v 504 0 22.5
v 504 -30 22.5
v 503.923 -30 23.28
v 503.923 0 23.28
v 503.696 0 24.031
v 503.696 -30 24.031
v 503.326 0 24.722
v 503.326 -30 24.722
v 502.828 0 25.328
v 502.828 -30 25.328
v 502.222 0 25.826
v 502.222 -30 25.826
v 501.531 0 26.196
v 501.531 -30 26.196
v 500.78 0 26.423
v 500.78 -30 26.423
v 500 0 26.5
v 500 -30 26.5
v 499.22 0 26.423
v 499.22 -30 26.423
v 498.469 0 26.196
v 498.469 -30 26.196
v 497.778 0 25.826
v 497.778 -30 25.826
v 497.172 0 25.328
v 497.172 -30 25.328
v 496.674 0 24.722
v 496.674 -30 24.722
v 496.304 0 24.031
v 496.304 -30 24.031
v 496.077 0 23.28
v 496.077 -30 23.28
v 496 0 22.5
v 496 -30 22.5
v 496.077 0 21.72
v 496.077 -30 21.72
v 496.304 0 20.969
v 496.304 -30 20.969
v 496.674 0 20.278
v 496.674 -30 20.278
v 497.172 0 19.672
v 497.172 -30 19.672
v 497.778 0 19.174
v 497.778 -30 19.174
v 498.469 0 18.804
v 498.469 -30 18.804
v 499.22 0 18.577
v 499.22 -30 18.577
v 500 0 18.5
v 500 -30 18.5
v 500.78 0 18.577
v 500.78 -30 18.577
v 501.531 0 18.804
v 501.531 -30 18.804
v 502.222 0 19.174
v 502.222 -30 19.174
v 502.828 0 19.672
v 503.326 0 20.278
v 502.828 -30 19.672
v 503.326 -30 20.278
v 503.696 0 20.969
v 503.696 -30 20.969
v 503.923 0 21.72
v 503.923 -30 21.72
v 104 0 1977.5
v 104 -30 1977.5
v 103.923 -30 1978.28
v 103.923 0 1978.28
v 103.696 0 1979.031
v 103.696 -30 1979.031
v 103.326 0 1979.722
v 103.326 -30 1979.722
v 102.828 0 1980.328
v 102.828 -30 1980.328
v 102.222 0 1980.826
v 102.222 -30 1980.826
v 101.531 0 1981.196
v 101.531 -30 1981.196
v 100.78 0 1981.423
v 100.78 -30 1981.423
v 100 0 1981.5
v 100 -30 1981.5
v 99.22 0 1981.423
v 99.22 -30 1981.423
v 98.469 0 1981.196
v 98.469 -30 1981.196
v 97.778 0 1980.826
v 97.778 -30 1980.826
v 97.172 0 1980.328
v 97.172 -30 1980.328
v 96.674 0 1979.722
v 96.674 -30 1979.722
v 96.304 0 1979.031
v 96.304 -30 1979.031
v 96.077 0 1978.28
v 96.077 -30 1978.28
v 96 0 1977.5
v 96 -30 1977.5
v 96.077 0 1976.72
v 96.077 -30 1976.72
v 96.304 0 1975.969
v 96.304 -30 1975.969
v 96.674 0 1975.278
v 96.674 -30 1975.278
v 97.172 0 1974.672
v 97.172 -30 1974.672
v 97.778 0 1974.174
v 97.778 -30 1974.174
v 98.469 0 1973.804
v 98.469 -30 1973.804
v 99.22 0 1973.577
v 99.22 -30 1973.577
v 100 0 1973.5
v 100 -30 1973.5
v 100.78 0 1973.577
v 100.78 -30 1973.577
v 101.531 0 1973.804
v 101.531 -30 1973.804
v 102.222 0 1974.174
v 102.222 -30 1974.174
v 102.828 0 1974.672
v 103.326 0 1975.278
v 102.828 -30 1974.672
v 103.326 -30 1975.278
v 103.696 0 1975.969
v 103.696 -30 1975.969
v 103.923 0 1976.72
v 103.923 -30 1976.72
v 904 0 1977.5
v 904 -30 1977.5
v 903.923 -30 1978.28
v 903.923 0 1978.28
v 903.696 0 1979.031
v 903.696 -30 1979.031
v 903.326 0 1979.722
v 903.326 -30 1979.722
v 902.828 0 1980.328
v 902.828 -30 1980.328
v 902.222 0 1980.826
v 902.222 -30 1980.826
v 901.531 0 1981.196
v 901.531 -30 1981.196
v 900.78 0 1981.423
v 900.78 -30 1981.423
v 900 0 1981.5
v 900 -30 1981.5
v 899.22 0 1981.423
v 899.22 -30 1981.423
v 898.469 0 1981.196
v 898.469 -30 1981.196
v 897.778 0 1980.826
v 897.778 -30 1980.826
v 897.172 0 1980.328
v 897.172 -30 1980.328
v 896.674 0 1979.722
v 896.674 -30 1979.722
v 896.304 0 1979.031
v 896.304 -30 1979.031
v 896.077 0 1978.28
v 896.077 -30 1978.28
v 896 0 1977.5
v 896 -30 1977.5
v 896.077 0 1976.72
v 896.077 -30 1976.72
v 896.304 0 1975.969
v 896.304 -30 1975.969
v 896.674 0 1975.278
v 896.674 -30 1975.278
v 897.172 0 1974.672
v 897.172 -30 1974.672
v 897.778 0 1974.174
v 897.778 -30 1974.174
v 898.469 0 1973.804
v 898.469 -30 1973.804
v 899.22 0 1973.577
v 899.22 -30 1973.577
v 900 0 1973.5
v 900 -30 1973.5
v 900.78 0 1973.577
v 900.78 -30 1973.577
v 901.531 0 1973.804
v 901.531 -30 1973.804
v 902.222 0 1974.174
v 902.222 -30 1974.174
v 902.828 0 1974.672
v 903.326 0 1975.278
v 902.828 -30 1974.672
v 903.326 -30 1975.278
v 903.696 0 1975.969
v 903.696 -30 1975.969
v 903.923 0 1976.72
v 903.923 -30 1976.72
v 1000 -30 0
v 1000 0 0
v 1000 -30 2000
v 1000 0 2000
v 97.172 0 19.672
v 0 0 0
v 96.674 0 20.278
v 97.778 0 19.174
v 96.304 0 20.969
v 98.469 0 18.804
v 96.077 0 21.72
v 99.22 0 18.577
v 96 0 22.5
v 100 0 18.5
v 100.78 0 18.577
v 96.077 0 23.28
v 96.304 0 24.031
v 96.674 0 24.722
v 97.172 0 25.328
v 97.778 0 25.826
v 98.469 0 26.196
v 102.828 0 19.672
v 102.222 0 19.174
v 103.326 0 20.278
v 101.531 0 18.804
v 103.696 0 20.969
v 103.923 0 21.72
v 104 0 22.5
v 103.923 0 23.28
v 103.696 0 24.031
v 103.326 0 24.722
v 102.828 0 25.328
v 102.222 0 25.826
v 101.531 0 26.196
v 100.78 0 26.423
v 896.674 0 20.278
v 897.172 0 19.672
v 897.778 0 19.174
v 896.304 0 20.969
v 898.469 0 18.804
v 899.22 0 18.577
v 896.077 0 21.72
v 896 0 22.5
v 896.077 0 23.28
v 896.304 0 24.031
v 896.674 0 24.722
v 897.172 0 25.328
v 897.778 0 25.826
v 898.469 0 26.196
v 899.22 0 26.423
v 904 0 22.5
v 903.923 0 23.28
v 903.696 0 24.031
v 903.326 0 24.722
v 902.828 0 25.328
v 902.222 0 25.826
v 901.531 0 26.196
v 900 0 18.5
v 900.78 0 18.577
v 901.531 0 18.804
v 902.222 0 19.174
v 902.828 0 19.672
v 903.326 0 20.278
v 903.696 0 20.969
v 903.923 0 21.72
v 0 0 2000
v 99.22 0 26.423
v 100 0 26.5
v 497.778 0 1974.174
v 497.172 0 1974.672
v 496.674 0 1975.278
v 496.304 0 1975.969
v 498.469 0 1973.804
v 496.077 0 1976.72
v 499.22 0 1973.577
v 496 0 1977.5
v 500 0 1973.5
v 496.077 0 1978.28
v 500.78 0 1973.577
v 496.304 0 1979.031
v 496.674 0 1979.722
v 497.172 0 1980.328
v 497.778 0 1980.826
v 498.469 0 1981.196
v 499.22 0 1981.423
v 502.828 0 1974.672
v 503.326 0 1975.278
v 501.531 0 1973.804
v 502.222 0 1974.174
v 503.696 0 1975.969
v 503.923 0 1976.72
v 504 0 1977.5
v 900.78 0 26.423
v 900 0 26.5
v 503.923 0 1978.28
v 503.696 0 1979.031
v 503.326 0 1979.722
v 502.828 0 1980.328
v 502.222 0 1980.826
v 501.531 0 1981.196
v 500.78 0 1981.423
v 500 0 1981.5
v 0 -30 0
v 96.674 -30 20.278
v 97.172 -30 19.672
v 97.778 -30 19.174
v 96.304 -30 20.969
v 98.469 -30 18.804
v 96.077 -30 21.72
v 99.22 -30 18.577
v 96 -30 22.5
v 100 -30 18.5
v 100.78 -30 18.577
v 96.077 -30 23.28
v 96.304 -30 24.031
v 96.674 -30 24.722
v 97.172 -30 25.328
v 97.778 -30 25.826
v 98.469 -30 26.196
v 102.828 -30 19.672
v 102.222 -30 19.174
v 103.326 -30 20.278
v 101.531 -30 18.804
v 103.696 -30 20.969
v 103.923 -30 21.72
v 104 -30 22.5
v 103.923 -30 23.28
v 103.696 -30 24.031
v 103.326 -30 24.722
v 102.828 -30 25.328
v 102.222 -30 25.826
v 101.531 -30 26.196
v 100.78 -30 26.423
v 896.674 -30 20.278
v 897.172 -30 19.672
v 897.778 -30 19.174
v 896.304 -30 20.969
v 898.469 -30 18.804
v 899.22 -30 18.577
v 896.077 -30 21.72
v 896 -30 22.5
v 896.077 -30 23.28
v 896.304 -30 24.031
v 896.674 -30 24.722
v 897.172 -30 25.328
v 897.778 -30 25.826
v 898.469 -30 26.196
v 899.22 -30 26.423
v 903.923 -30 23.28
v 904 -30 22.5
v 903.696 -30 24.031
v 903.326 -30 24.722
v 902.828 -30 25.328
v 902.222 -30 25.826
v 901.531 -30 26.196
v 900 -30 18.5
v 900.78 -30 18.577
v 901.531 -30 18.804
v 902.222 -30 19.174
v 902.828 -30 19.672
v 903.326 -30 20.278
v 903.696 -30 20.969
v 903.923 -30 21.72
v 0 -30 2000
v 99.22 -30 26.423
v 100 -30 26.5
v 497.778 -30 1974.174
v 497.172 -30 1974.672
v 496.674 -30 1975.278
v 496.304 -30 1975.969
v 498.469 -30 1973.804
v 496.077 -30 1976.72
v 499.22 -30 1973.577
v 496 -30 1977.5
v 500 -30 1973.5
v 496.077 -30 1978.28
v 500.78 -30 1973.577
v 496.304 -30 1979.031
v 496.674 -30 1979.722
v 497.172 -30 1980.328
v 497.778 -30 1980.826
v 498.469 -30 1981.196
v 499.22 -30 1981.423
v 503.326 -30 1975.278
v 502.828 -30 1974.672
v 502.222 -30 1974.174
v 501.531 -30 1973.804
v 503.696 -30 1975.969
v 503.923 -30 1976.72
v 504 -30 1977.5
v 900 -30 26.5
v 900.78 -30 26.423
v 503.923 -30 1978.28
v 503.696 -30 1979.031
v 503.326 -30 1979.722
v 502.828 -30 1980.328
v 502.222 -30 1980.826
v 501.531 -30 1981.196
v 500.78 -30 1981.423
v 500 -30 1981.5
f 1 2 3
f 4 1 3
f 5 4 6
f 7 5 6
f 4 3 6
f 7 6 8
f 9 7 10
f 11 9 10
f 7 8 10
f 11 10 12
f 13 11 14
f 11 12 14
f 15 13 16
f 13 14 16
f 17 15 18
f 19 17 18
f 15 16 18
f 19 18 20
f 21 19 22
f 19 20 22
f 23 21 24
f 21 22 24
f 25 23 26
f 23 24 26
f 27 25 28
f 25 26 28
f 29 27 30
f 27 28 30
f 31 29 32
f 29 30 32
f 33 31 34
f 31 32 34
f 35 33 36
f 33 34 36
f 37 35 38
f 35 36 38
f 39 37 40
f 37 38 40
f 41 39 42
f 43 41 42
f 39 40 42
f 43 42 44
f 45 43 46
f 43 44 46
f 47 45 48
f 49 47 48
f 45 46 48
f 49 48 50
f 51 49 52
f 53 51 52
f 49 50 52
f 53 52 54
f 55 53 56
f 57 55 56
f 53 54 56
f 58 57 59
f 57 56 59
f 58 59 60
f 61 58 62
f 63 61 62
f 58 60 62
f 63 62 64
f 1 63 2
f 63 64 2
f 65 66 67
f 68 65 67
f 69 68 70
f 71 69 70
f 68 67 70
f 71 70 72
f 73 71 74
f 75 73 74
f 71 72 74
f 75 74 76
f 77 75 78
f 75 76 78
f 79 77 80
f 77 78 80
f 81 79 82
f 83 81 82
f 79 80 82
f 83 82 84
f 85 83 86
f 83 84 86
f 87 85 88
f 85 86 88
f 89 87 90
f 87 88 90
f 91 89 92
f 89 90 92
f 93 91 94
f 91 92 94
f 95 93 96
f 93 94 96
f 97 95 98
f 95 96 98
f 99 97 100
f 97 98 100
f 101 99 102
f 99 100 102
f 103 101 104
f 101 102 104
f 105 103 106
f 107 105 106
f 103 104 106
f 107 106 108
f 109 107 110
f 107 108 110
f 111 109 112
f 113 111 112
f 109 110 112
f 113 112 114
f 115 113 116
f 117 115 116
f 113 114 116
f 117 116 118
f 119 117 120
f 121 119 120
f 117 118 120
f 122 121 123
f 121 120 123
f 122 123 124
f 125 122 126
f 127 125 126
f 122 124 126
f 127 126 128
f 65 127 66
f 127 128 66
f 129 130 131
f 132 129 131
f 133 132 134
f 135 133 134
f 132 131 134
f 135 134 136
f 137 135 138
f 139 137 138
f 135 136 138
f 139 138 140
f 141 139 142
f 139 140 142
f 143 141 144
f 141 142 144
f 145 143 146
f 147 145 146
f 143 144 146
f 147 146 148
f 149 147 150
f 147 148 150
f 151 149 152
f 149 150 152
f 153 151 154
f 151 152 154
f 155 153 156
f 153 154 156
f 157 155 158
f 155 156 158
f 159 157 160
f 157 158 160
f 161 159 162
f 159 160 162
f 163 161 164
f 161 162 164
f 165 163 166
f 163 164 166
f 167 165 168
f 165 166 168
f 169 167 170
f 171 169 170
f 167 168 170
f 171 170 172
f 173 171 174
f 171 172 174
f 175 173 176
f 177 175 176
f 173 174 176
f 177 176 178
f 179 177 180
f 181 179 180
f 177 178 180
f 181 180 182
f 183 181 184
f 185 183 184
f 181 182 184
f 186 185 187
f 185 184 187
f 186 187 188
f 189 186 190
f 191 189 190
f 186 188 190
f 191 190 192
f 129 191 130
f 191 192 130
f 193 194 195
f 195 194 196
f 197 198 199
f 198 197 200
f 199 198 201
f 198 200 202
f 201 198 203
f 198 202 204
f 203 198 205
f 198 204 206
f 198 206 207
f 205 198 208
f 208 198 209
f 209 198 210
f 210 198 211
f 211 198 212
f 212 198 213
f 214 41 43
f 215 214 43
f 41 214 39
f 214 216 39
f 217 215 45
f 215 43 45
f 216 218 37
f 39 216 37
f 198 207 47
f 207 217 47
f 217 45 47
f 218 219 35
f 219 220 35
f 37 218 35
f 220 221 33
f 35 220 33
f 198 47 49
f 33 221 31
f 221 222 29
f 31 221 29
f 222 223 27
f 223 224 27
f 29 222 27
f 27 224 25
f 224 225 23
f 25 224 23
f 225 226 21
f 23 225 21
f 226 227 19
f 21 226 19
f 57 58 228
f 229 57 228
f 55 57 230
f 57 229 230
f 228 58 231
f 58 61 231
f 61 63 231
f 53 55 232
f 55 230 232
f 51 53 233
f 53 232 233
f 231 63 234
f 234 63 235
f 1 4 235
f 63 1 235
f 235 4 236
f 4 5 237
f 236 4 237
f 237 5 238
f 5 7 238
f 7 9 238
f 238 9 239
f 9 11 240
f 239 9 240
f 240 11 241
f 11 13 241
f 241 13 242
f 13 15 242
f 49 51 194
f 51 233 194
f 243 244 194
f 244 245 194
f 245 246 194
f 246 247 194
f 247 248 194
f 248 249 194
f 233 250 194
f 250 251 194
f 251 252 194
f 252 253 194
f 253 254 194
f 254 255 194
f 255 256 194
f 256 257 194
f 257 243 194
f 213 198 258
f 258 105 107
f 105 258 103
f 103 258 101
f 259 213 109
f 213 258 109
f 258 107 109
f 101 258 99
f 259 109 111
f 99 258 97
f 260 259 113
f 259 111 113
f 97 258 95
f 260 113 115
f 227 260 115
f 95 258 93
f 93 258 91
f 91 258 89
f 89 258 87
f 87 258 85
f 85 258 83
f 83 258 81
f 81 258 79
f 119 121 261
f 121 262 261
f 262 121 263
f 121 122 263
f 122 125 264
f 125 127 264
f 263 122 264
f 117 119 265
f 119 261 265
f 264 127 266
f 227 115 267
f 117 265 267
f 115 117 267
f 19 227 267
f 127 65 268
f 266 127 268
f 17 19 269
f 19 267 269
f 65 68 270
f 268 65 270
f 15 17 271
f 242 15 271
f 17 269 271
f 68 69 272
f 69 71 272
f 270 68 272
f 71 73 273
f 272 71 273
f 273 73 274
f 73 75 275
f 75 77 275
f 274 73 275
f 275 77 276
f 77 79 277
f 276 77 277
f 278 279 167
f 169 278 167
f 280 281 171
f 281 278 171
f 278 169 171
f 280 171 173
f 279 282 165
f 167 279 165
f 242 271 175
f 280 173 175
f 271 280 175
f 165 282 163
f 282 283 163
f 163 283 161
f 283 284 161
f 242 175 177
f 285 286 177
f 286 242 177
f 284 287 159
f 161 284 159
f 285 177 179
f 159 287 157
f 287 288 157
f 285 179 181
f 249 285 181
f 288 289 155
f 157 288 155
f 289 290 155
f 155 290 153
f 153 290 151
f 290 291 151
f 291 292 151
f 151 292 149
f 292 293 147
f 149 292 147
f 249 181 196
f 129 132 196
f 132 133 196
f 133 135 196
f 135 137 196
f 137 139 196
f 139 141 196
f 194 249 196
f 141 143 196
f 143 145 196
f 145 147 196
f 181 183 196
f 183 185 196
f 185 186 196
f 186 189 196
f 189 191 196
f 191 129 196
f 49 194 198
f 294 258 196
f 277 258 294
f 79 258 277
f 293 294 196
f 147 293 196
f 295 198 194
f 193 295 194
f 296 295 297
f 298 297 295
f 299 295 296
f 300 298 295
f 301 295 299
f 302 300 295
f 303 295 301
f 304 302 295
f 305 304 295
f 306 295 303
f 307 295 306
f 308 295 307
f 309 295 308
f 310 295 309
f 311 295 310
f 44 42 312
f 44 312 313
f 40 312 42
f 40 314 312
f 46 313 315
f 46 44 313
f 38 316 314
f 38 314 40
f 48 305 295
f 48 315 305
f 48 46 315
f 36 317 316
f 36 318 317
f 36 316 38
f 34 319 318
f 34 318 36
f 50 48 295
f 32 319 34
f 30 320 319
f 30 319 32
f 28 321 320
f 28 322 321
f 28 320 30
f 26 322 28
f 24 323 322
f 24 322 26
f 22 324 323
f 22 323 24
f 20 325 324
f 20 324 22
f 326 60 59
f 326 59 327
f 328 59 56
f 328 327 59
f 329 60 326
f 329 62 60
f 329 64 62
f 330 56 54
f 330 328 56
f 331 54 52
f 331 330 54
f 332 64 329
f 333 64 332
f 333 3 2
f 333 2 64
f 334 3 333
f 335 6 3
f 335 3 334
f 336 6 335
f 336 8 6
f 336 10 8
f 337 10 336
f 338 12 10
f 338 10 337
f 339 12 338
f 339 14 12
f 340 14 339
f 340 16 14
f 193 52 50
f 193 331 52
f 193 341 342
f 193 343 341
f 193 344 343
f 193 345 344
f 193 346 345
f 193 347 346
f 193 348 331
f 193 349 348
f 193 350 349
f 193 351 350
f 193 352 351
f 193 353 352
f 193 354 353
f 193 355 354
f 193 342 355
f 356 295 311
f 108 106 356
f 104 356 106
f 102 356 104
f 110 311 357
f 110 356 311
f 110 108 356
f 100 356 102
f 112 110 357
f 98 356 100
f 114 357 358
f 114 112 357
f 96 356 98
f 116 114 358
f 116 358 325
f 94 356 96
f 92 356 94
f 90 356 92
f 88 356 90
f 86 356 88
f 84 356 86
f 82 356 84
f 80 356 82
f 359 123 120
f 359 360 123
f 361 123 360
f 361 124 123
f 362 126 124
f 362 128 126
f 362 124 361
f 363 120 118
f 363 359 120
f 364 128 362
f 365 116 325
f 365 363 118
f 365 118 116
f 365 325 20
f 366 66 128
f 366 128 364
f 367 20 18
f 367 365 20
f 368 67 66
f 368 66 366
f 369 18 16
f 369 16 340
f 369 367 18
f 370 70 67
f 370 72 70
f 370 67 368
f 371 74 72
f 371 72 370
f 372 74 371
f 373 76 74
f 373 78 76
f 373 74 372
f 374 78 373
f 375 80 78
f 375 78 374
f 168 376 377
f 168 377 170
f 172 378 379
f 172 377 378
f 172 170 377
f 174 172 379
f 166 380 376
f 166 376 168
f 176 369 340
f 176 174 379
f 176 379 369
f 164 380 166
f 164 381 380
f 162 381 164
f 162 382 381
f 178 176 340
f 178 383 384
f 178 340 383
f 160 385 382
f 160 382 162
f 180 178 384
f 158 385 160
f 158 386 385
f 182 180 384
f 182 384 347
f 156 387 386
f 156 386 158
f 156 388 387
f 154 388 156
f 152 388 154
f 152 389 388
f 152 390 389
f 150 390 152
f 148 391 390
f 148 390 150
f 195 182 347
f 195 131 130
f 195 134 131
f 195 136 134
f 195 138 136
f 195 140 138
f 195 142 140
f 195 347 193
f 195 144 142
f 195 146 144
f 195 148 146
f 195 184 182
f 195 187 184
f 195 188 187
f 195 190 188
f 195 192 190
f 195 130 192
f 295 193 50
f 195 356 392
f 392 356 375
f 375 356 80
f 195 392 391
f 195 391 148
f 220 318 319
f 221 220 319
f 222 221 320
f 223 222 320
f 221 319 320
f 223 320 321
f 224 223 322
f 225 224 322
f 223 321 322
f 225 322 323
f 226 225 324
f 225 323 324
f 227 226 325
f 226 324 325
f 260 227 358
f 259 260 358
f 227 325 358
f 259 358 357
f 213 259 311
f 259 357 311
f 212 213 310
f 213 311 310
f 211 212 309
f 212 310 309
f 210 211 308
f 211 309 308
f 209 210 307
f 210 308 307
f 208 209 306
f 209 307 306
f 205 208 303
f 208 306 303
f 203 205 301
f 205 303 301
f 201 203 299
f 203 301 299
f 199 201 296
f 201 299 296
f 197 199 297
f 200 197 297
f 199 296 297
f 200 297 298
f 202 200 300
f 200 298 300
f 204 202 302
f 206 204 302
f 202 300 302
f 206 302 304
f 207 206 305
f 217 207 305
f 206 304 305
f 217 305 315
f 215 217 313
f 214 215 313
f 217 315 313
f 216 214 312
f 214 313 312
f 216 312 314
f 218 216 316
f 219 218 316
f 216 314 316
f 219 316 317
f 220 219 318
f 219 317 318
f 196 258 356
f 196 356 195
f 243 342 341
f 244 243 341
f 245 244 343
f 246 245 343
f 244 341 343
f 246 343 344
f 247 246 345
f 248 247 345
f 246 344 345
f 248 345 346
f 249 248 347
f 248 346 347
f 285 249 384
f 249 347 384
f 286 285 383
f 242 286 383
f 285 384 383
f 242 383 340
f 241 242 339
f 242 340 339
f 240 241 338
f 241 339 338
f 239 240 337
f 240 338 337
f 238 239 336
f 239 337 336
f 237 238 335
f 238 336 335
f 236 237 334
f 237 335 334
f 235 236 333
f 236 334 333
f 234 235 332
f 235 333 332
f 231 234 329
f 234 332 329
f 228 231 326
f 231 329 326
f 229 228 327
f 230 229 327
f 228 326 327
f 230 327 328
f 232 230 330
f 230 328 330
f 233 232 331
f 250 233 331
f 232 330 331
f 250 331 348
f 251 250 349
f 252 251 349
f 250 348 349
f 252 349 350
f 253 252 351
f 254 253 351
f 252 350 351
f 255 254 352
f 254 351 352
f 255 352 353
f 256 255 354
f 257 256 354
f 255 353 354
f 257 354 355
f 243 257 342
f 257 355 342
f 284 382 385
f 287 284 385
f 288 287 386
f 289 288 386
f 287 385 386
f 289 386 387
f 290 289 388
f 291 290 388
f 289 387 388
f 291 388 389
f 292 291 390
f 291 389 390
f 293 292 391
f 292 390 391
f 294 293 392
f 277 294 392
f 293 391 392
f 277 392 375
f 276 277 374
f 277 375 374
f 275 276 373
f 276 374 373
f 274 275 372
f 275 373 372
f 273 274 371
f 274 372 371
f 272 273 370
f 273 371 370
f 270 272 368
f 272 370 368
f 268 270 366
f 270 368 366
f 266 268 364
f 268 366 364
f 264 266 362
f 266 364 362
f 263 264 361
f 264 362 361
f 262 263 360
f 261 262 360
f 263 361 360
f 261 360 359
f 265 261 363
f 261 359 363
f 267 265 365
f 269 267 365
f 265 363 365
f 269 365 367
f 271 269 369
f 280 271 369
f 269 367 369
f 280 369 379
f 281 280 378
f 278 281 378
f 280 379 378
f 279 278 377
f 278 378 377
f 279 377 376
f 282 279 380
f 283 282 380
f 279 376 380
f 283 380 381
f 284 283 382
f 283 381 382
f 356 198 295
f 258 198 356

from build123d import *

# Parameters (mm, degrees)
F0_W     = 1000
F0_H     = 2000
F1_DEPTH = 30
F2_R     = 4
F3_DEPTH = 30


with BuildPart() as f1:
    # F0 (on Front) → F1 (new body)
    with BuildSketch(Plane.XZ):
        with Locations((500, 1000)):
            Rectangle(F0_W, F0_H)
    extrude(amount=F1_DEPTH)

    # F2 (on face) → F3 (cut)
    with BuildSketch(Plane.XZ.offset(30)):
        with Locations((100, 22.5)):
            Circle(F2_R)
        with Locations((500, 22.5)):
            Circle(F2_R)
        with Locations((900, 22.5)):
            Circle(F2_R)
        with Locations((100, 1977.5)):
            Circle(F2_R)
        with Locations((500, 1977.5)):
            Circle(F2_R)
        with Locations((900, 1977.5)):
            Circle(F2_R)
    extrude(amount=-F3_DEPTH, mode=Mode.SUBTRACT)


solid = f1.part
